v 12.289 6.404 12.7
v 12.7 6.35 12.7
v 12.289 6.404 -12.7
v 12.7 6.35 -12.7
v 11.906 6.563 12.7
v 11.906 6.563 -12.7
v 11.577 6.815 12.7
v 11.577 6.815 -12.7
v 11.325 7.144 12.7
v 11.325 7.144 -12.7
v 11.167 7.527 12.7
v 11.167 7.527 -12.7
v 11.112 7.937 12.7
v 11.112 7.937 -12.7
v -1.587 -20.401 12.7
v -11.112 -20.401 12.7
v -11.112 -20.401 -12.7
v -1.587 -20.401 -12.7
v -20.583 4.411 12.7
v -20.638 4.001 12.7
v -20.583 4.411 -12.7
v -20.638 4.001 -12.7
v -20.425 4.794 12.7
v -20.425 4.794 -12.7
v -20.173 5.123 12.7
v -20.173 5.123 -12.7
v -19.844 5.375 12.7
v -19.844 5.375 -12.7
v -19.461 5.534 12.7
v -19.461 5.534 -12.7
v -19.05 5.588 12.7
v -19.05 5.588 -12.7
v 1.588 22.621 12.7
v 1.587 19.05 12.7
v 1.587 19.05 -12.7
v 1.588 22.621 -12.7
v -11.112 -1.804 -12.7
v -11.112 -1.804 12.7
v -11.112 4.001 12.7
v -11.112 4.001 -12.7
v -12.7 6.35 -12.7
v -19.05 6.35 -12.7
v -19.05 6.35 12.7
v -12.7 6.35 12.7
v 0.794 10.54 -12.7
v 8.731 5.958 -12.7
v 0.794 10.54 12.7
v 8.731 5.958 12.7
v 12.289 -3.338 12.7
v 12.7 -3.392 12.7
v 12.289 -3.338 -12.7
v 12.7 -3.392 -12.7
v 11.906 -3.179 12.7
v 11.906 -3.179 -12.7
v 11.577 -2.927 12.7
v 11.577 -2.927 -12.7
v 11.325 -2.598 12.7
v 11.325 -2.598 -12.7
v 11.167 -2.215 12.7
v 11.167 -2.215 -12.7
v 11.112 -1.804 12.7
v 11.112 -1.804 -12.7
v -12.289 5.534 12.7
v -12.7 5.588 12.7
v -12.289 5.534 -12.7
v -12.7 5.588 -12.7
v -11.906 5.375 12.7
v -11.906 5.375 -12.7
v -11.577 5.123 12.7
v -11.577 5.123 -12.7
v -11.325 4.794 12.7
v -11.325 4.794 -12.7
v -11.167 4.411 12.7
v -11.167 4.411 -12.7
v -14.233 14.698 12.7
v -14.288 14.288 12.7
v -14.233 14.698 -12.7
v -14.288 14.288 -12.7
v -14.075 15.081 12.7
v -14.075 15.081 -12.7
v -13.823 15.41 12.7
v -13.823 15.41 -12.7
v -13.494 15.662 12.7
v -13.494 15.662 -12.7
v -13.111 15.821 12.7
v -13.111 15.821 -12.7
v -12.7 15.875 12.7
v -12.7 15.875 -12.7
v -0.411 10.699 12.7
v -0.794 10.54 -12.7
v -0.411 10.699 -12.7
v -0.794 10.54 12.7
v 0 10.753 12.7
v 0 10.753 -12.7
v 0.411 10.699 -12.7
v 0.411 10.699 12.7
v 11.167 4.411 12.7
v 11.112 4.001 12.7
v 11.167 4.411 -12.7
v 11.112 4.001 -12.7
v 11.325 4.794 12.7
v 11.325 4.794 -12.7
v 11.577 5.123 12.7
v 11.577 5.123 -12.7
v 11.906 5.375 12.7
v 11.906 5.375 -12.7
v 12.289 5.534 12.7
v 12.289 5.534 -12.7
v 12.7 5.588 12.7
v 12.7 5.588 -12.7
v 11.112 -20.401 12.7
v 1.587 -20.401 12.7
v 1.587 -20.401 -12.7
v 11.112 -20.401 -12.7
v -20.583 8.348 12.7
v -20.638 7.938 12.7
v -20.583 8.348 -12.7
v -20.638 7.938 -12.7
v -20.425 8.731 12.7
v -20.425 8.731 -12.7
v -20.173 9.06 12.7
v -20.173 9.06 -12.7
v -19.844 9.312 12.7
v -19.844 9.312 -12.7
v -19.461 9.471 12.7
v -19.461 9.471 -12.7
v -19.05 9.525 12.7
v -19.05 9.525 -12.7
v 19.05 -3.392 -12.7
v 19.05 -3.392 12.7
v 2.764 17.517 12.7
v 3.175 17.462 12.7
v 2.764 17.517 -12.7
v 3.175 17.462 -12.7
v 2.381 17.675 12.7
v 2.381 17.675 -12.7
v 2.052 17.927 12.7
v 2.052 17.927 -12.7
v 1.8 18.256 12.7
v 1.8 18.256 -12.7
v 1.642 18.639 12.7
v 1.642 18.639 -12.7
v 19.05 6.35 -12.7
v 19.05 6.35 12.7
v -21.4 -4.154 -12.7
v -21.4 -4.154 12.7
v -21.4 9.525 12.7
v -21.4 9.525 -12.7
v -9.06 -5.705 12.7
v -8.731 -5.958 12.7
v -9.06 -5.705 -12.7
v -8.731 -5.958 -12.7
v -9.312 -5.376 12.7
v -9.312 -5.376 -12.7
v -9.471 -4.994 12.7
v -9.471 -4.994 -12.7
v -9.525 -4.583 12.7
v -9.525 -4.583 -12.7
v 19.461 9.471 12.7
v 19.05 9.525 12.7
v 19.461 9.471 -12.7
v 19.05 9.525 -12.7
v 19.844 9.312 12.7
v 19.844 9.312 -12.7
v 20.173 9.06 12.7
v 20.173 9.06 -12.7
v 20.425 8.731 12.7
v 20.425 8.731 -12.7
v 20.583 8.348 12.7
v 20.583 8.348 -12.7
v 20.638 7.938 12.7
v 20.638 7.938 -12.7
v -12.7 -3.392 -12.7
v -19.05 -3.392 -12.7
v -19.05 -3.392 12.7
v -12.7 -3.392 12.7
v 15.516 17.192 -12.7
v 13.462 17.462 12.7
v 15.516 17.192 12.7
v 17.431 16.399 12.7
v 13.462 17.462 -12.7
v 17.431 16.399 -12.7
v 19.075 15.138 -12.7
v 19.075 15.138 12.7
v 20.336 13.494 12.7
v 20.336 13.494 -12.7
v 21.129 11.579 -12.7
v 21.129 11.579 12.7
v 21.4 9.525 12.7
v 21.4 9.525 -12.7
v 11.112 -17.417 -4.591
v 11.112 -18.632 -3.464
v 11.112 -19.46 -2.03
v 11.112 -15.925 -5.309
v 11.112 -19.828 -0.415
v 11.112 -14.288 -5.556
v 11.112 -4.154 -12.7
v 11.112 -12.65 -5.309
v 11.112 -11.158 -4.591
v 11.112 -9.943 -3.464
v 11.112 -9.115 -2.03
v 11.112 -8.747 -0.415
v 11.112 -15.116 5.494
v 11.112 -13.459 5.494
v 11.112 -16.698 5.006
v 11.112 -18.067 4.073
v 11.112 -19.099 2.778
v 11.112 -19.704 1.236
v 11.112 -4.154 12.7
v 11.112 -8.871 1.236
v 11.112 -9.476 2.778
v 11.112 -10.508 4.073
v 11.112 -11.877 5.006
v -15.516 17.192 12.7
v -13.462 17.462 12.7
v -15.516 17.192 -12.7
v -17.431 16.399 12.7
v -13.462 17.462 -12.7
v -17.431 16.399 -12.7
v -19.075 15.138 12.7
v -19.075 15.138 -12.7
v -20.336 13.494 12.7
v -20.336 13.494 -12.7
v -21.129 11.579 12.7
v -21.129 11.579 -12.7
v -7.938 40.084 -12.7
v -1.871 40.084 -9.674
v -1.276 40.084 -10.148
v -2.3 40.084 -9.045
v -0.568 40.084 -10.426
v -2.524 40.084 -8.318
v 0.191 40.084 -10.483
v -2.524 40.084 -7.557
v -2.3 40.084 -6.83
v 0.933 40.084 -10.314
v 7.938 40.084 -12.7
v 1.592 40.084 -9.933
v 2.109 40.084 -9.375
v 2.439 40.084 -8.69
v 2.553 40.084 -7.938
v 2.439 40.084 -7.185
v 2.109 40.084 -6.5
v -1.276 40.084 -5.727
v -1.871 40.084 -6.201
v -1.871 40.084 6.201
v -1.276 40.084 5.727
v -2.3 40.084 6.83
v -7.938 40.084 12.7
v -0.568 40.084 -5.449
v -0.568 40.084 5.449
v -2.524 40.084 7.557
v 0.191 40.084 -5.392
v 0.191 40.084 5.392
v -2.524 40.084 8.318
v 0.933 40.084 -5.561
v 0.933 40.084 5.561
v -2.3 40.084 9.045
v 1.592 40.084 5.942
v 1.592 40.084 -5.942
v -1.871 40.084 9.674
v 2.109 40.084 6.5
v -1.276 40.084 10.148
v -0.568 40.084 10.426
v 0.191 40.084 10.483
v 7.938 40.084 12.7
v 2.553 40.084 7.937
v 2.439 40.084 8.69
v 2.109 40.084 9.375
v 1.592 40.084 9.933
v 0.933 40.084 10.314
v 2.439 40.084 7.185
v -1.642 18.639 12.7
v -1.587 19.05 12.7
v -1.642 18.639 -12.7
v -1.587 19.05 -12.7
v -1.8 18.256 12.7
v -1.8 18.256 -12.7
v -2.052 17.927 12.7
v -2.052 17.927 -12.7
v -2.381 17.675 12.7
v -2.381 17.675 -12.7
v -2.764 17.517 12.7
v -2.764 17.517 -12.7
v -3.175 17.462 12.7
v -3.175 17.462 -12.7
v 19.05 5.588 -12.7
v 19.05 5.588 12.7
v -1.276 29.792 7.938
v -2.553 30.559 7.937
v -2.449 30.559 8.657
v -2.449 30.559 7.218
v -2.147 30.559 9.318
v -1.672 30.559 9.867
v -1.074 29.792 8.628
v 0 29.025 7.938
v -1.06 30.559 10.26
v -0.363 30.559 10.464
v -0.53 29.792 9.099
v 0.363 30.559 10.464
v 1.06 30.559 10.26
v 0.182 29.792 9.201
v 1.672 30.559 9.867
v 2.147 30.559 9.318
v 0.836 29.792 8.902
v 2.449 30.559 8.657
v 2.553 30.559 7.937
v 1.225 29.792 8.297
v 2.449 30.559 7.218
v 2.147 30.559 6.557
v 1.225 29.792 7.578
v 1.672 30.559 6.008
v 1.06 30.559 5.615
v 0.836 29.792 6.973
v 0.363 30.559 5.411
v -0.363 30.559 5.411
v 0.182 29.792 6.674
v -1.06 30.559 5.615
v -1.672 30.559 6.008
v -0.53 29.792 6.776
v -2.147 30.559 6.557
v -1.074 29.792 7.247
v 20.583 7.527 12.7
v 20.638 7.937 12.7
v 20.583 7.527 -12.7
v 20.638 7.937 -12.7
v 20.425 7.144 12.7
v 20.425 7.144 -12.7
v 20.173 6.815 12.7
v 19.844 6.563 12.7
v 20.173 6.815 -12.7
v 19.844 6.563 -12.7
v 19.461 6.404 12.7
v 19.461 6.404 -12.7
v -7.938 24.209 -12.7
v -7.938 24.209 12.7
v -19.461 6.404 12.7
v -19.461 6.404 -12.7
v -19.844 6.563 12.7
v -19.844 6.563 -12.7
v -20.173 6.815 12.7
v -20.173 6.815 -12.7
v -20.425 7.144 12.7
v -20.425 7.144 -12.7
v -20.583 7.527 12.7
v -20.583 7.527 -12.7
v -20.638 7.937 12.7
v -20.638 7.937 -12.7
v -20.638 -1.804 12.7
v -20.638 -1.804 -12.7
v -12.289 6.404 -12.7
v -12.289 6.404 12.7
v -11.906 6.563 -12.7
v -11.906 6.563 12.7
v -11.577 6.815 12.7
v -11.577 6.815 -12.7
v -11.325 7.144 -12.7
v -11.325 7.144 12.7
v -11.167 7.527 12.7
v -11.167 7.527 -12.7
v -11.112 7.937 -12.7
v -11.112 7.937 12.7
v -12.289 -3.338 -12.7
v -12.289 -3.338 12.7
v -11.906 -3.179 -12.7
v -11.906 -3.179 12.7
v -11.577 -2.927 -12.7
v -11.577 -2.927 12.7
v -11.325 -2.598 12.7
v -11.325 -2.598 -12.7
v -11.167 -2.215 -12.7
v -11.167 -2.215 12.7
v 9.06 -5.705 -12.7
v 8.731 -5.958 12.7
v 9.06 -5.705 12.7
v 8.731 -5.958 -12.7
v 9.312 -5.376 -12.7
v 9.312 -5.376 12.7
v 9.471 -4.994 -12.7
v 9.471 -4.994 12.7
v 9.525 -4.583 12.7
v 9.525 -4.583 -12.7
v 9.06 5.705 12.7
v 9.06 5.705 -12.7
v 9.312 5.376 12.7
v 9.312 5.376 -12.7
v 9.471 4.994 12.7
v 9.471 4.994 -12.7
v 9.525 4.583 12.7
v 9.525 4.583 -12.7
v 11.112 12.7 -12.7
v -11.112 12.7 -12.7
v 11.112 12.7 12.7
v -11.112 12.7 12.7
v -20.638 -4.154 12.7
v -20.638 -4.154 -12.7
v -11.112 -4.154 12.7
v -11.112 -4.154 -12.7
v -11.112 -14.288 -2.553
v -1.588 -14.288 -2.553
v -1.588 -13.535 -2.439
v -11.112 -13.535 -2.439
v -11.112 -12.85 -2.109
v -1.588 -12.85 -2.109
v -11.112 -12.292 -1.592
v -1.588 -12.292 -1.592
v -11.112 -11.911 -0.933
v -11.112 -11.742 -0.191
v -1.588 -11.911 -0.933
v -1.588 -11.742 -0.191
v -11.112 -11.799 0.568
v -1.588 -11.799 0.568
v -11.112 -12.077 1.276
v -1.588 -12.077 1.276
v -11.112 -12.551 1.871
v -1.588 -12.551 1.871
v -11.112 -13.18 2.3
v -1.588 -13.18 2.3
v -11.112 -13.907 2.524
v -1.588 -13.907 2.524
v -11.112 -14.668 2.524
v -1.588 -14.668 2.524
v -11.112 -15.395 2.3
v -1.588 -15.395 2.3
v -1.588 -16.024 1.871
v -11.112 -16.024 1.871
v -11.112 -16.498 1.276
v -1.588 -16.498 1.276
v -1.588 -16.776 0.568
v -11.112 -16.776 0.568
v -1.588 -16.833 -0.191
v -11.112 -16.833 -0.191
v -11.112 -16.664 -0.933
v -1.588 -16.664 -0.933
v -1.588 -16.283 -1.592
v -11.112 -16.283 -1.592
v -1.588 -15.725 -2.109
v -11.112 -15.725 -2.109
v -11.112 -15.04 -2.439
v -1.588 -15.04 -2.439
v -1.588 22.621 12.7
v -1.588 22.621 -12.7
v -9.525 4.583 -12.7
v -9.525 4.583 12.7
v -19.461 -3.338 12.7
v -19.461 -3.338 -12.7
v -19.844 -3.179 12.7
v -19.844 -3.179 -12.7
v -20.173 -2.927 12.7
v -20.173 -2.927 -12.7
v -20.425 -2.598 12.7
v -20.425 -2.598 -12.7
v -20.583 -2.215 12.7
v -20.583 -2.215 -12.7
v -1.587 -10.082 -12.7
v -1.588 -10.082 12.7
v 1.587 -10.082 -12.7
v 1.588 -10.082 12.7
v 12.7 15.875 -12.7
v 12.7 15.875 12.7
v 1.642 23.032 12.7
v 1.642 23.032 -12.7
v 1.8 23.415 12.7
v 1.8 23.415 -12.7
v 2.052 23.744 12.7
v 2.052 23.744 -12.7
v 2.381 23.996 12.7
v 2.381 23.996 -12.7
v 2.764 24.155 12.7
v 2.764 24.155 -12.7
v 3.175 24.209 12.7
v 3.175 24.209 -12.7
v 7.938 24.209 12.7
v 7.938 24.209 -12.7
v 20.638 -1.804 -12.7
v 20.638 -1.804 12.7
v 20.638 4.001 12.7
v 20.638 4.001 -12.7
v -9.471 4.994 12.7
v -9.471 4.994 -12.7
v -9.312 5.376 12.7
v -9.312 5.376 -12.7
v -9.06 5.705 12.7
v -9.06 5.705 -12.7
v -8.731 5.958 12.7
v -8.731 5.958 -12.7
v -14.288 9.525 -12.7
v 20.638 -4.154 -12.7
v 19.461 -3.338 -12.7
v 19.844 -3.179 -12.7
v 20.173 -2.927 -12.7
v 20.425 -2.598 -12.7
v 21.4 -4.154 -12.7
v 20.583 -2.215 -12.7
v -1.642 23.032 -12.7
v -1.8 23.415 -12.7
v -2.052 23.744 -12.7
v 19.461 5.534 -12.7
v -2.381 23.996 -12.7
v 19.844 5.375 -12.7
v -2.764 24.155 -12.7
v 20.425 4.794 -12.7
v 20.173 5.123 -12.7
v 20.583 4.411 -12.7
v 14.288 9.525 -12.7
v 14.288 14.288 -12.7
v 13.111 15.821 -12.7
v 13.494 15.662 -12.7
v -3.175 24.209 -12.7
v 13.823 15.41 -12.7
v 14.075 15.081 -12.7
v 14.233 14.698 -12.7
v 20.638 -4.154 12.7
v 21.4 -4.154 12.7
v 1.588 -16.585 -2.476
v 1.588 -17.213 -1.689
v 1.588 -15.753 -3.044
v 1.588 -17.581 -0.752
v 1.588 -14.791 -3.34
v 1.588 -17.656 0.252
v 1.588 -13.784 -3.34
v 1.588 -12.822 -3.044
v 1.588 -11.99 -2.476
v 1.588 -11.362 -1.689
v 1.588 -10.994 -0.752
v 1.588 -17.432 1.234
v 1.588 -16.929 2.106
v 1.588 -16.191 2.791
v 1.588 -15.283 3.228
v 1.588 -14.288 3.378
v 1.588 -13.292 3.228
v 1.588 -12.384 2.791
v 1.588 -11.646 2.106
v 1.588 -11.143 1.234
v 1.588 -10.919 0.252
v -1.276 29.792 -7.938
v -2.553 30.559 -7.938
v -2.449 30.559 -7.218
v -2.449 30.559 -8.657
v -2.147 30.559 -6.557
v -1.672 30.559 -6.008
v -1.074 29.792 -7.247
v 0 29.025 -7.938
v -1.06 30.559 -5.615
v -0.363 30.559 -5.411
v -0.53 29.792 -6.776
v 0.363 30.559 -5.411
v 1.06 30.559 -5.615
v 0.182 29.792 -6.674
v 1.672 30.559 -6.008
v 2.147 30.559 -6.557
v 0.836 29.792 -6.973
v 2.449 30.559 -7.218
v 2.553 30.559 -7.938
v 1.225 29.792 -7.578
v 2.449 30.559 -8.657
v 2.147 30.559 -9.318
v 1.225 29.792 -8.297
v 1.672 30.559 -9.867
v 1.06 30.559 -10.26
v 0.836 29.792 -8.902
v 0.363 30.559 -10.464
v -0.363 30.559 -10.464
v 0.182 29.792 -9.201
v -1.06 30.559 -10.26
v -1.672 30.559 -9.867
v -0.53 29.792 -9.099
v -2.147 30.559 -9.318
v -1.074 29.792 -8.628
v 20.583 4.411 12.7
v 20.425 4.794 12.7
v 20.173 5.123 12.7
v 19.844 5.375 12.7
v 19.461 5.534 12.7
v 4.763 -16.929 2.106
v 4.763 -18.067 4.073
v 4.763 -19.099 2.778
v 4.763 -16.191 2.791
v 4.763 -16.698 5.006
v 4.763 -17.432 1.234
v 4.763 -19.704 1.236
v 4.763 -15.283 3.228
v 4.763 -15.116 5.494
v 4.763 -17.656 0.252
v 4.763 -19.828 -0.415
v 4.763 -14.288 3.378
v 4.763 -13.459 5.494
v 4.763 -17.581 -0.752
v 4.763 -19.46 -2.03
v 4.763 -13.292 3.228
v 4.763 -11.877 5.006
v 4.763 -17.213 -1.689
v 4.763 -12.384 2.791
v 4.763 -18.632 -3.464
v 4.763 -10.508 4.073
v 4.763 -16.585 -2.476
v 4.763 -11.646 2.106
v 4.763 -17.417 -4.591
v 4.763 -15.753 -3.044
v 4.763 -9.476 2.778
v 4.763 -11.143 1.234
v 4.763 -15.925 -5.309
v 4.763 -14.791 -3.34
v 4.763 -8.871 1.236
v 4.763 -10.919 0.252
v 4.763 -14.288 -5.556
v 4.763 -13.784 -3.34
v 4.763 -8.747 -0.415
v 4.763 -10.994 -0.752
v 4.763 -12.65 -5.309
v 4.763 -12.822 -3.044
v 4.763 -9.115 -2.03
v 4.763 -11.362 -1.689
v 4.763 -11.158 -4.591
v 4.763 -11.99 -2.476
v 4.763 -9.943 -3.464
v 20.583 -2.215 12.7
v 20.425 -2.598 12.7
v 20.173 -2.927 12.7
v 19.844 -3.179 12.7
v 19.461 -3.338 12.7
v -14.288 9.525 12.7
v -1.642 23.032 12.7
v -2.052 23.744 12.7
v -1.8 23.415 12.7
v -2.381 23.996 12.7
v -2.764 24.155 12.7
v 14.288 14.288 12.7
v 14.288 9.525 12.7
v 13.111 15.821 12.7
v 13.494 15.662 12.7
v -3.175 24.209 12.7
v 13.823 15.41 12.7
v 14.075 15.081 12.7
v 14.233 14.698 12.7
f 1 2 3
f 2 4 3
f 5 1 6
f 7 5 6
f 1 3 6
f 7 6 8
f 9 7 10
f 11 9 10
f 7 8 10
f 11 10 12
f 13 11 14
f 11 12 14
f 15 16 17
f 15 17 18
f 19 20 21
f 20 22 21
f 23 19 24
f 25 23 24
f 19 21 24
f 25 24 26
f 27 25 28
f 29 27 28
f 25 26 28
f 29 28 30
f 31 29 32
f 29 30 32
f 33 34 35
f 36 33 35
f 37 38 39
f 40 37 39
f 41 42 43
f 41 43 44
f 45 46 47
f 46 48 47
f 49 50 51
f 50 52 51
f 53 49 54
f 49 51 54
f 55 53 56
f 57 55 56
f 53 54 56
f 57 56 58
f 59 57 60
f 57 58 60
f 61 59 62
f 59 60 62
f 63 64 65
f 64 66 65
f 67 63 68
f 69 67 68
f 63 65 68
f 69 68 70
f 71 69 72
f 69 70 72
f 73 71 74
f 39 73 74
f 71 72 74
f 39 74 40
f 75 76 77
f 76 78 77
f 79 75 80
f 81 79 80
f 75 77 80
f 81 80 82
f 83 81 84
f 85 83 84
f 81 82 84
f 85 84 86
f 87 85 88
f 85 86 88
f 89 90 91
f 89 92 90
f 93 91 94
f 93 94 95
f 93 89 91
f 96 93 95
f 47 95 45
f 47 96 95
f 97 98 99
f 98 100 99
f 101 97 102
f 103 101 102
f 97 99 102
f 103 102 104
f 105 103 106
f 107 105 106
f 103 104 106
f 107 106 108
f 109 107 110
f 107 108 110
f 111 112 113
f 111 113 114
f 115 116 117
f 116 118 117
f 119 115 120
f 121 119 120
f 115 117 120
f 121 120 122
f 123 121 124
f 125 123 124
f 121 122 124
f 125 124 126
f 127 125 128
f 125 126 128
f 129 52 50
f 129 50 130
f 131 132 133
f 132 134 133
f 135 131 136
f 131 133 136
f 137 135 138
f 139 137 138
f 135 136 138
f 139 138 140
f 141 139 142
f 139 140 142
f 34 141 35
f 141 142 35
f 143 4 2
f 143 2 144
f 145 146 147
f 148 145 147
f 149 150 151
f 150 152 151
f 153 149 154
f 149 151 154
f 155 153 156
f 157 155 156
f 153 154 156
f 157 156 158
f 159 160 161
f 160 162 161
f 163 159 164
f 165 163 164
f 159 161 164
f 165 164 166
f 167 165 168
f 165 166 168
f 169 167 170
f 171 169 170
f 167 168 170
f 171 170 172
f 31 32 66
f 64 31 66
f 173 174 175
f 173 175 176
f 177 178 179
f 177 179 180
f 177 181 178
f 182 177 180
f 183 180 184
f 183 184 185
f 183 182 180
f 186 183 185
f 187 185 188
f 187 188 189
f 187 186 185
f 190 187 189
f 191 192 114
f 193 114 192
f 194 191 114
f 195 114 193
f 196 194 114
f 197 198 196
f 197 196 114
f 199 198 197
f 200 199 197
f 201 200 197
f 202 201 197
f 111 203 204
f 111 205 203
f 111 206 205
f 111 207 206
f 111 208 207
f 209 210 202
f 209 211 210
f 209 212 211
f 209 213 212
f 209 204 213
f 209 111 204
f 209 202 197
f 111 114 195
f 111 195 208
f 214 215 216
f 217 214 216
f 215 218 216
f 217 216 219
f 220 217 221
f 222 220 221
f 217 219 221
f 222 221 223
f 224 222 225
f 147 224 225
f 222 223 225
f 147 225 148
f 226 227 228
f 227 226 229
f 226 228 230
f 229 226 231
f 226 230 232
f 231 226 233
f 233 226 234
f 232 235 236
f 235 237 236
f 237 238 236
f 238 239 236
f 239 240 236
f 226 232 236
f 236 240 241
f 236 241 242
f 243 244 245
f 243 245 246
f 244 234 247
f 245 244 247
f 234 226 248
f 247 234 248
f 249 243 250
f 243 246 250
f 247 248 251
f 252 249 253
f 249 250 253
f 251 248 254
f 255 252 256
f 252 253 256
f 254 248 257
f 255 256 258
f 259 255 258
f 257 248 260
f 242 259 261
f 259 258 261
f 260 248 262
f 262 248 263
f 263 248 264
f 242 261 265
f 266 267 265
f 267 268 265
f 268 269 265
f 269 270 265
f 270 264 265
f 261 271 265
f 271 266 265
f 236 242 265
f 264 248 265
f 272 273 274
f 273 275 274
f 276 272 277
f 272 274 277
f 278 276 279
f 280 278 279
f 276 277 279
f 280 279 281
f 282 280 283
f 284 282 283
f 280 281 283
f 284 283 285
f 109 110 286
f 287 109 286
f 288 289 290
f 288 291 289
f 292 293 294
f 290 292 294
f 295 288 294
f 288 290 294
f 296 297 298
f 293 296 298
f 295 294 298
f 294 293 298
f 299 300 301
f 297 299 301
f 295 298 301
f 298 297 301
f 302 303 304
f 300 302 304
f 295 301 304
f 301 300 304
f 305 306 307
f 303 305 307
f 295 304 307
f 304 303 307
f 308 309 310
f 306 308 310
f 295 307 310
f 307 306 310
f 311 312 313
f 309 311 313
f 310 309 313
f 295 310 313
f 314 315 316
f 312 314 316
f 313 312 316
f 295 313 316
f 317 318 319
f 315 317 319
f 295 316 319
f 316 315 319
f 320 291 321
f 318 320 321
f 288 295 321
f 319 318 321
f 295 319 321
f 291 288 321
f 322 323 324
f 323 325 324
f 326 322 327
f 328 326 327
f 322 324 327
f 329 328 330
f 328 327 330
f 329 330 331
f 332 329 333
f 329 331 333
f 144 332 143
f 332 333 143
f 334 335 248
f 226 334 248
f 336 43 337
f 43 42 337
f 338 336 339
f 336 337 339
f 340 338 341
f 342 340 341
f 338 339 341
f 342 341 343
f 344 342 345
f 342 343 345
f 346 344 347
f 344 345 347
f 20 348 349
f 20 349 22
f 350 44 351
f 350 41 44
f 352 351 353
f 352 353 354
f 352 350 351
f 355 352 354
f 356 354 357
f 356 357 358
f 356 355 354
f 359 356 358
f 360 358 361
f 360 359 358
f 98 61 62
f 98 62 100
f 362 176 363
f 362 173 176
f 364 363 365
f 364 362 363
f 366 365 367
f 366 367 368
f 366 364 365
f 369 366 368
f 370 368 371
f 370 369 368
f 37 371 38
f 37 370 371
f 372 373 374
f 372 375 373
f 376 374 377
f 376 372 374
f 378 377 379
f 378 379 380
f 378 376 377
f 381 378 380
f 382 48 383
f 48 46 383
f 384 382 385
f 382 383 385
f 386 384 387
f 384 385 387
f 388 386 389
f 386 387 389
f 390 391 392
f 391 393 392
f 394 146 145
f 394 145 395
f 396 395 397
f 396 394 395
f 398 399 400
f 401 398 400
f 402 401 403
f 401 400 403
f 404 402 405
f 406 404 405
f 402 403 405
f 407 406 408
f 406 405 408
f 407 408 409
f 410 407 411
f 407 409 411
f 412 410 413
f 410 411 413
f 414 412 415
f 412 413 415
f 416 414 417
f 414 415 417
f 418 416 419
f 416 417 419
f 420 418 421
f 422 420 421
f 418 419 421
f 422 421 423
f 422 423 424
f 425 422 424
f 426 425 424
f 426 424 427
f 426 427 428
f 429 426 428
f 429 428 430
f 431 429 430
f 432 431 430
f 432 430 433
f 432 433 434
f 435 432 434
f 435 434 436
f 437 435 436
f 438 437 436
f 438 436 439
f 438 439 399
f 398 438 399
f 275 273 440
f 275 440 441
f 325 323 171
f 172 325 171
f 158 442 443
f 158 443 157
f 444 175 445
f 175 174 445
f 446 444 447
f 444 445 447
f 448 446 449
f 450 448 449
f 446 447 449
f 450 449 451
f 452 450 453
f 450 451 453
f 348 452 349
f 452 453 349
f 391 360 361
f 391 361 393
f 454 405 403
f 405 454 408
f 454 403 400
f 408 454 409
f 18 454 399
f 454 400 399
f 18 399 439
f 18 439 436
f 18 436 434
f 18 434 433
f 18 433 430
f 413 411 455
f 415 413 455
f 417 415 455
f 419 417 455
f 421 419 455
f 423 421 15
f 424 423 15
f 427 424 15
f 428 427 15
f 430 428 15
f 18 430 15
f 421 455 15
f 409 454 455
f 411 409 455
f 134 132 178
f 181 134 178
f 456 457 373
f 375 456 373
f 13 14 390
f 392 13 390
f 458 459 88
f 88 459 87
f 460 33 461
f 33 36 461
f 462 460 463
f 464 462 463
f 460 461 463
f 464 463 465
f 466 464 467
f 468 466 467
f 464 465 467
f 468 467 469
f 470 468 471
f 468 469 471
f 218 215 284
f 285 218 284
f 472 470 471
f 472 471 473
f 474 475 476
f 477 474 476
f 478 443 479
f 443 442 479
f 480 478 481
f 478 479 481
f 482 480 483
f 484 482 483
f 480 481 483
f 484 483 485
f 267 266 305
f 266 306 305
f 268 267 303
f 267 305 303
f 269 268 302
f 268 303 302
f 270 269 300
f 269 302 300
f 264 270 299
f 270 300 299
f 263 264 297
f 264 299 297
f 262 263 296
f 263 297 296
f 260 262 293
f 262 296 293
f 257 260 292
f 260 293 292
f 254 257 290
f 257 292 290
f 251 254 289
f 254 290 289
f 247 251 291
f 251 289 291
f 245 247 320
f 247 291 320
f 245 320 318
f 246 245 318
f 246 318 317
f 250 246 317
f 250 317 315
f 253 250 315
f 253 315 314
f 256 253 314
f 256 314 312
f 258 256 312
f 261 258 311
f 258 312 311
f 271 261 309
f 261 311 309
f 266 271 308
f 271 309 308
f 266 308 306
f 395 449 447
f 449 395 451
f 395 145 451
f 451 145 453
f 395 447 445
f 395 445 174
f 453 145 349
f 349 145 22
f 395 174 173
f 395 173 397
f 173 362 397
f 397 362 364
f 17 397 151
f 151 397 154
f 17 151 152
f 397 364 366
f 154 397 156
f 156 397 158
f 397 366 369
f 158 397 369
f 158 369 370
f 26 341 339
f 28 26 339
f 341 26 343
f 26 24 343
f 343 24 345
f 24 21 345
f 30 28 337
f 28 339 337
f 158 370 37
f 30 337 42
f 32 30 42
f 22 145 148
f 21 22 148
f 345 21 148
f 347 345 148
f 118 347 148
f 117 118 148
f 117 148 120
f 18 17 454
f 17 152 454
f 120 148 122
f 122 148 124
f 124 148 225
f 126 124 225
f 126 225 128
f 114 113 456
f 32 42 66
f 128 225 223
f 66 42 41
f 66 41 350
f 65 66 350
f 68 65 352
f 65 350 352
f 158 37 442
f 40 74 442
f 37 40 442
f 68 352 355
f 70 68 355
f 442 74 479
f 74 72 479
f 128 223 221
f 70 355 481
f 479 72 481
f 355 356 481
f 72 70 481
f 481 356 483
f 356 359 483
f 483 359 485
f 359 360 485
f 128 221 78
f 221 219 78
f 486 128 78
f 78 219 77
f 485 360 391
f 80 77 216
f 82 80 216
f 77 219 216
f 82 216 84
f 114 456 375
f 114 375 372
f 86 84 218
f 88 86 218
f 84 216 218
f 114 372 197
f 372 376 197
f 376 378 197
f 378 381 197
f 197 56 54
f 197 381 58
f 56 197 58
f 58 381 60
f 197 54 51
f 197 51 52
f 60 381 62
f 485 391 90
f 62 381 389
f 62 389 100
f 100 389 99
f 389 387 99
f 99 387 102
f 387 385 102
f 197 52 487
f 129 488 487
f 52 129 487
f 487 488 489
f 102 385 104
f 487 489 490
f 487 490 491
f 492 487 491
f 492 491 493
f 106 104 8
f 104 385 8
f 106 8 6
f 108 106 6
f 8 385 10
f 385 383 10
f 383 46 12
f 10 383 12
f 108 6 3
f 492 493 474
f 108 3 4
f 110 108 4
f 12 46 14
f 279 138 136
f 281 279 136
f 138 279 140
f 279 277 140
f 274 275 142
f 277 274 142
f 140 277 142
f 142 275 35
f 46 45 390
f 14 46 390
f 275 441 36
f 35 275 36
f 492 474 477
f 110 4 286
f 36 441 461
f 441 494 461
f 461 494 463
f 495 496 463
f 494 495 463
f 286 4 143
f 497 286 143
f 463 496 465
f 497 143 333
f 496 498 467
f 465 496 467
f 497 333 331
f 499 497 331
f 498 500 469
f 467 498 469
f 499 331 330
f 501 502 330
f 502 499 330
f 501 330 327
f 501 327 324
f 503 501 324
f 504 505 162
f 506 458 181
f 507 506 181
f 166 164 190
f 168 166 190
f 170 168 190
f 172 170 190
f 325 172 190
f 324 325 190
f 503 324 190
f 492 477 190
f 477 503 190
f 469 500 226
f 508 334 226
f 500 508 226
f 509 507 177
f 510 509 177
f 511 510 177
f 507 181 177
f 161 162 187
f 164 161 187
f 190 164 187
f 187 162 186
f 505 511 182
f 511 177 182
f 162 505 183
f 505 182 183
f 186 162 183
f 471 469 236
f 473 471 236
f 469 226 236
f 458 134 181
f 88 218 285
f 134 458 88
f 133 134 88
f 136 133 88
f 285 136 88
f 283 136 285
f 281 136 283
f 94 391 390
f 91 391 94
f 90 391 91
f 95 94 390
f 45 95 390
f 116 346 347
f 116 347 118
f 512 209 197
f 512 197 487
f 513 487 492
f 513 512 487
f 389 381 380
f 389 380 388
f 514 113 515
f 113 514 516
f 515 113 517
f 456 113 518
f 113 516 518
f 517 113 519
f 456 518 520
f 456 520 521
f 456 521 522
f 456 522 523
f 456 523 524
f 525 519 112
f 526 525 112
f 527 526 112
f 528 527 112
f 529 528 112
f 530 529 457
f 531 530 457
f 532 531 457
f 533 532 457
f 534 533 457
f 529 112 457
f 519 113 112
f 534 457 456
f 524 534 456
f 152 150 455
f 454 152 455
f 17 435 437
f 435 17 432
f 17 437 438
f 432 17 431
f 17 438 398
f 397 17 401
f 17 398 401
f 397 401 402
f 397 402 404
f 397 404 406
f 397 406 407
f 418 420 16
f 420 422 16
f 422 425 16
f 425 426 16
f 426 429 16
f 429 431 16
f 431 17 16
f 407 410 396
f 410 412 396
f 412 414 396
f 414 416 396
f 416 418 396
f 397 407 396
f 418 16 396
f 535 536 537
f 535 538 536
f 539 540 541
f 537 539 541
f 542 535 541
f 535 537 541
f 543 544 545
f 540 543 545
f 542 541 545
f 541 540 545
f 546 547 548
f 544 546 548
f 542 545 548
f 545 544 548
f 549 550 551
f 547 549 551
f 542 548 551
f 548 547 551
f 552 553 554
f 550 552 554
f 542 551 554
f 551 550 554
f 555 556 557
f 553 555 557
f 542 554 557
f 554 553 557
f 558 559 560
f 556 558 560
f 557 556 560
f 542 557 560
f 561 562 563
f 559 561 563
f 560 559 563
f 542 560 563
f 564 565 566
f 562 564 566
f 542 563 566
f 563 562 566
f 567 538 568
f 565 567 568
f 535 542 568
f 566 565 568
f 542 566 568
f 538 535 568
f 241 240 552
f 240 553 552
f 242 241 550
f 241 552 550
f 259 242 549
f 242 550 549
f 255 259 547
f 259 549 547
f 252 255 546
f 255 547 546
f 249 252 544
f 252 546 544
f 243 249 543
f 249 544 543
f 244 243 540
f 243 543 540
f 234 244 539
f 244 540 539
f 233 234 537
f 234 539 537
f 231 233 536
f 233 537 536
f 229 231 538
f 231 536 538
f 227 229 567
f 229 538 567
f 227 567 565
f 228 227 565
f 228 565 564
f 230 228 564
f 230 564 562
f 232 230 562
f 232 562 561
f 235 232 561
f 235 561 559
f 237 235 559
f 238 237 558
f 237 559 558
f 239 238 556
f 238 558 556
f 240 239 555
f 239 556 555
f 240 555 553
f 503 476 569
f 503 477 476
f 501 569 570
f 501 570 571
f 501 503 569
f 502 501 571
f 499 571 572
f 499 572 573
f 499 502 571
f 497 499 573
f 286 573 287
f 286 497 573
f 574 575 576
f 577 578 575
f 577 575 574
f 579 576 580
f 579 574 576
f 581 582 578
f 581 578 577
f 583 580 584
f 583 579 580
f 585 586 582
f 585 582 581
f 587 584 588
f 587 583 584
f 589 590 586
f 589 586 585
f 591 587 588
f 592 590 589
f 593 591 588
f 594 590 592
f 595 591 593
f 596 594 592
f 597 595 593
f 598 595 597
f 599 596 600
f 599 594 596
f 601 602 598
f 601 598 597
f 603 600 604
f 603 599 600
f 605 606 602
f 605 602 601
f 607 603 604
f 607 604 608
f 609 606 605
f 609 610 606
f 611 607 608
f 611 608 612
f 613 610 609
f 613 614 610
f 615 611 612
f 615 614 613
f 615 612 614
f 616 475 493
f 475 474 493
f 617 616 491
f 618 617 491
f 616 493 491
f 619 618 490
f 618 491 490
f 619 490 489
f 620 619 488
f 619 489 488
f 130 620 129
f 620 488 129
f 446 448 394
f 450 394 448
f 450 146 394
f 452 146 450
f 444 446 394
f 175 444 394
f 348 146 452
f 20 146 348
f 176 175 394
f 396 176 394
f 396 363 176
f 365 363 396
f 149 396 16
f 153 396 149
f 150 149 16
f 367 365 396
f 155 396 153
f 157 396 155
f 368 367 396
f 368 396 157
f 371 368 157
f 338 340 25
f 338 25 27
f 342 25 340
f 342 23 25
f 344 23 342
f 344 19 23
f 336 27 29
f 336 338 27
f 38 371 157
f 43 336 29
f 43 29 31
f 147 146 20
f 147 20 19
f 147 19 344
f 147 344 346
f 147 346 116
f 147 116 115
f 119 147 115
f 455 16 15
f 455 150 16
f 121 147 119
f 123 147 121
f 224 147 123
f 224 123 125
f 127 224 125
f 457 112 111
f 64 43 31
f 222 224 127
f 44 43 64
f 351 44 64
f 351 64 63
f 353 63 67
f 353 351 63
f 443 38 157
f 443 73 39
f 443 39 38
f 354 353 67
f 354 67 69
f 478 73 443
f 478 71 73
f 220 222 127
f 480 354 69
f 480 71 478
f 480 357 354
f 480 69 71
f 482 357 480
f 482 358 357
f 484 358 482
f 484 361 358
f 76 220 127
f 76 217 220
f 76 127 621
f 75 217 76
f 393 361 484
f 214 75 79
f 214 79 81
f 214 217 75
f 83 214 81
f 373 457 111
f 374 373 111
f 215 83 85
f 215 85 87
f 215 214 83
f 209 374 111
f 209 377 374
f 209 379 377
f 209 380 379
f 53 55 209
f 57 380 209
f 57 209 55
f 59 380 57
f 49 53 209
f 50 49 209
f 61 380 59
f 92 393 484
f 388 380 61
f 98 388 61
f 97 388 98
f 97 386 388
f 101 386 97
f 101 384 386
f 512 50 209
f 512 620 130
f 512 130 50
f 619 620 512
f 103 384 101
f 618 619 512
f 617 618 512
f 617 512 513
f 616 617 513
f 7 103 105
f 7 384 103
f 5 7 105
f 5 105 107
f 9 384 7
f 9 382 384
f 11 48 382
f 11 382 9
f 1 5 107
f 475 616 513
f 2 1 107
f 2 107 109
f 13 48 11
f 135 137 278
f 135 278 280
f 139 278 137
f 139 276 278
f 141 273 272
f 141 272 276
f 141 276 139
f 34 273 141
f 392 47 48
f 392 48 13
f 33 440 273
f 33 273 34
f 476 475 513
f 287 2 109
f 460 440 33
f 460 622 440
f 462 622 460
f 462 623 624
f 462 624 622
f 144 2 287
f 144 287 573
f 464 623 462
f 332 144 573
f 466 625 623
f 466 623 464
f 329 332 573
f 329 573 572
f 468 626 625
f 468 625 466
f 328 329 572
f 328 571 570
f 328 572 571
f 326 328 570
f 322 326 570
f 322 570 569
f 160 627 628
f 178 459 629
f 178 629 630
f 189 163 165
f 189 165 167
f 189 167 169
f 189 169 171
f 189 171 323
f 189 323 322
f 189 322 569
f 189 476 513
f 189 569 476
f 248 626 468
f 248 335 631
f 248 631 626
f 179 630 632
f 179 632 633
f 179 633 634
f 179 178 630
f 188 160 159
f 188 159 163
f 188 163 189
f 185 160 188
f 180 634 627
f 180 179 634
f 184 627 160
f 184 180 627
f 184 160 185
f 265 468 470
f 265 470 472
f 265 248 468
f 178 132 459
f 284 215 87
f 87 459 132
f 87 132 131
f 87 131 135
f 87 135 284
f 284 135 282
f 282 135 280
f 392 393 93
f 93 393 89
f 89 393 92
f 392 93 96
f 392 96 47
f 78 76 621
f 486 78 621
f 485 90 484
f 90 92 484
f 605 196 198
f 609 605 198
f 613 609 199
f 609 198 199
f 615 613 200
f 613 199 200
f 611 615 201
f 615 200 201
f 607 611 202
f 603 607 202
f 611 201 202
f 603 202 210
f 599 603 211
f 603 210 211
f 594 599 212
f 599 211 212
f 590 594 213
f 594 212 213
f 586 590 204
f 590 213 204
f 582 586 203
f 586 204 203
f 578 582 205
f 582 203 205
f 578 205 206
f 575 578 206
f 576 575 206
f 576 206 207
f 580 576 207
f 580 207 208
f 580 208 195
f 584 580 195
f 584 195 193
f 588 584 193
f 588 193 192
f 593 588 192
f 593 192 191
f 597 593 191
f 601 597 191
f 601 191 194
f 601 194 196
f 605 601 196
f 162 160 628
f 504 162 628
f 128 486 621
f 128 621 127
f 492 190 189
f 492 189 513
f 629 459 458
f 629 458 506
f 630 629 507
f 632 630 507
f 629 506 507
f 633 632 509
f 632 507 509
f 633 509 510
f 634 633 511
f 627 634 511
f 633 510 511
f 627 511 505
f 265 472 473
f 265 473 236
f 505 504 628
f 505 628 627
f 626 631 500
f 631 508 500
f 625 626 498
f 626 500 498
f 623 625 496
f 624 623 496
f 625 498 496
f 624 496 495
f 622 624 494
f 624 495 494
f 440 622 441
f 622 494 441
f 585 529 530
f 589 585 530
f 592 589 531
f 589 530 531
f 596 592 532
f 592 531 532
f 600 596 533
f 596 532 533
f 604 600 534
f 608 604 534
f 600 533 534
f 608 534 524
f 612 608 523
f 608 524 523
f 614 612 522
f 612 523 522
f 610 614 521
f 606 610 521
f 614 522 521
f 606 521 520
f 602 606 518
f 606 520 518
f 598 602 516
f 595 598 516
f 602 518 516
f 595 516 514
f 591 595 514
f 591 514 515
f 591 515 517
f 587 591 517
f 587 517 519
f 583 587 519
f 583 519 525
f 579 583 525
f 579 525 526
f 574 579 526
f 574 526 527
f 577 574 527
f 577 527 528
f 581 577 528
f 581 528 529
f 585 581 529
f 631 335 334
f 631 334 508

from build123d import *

# Parameters (mm, degrees)
SKETCH1_W                                        = 22.225
SKETCH1_H                                        = 25.4
EXTRUDE1_DEPTH                                   = 12.7
SKETCH2_W                                        = 9.525
SKETCH2_H                                        = 0.762
EXTRUDE2_DEPTH                                   = 25.4
SKETCH3_W                                        = 0.762
SKETCH3_H                                        = 13.678822609
EXTRUDE3_DEPTH                                   = 25.4
EXTRUDE4_DEPTH                                   = 25.4
SKETCH7_W                                        = 3.175
SKETCH7_H                                        = 25.4
EXTRUDE5_DEPTH                                   = 6.74624
SKETCH8_W                                        = 15.875
SKETCH8_H                                        = 15.875
EXTRUDE6_DEPTH                                   = 25.4
F_1_4_20_TAPPED_HOLE1_D                          = 5.1054
F_1_4_20_TAPPED_HOLE1_DEPTH                      = 9.525
F_1_4_20_TAPPED_HOLE1_TIP                        = 1.533816902
EXTRUDE7_DEPTH                                   = 53.055785583
SKETCH10_W                                       = 9.525
SKETCH10_H                                       = 7.700729076
EXTRUDE8_DEPTH                                   = 25.4
CBORE_FOR_1_4_SOCKET_HEAD_CAP_SCREW1_D           = 6.7564
CBORE_FOR_1_4_SOCKET_HEAD_CAP_SCREW1_DEPTH       = 9.525
CBORE_FOR_1_4_SOCKET_HEAD_CAP_SCREW1_CBORE_D     = 11.1125
CBORE_FOR_1_4_SOCKET_HEAD_CAP_SCREW1_CBORE_DEPTH = 6.35
F_1_4_20_TAPPED_HOLE2_D                          = 5.1054
FILLET1_R                                        = 1.5875
FILLET2_R                                        = 7.9375


with BuildPart() as part:
    # Sketch1 → Extrude1 (new, symmetric)
    with BuildSketch(Plane.XY):
        Rectangle(SKETCH1_W, SKETCH1_H)
        Polygon((0, 10.998522628), (-9.525, 5.499261314), (-9.525, -5.499261314), (0, -10.998522628), (9.525, -5.499261314), (9.525, 5.499261314), align=None, mode=Mode.SUBTRACT)
    extrude(amount=EXTRUDE1_DEPTH, both=True)

    # Sketch2 → Extrude2 (add)
    with BuildSketch(Plane.XY.offset(12.7)):
        with Locations((15.875, 5.969)):
            Rectangle(SKETCH2_W, SKETCH2_H)
        with Locations((15.875, -3.772822609)):
            Rectangle(SKETCH2_W, SKETCH2_H)
        with Locations((-15.875, -3.772822609)):
            Rectangle(SKETCH2_W, SKETCH2_H)
        with Locations((-15.875, 5.969)):
            Rectangle(SKETCH2_W, SKETCH2_H)
    extrude(amount=-EXTRUDE2_DEPTH)

    # Sketch3 → Extrude3 (add)
    with BuildSketch(Plane.XY.offset(12.7)):
        with Locations((21.0185, 2.685588695)):
            Rectangle(SKETCH3_W, SKETCH3_H)
        with Locations((-21.0185, 2.685588695)):
            Rectangle(SKETCH3_W, SKETCH3_H)
    extrude(amount=-EXTRUDE3_DEPTH)

    # Sketch4 → Extrude4 (add)
    with BuildSketch(Plane.XY.offset(12.7)):
        Polygon((-21.3995, 17.4625), (21.3995, 17.4625), (21.3995, 9.525), (14.2875, 9.525), (14.2875, 15.875), (-14.2875, 15.875), (-14.2875, 9.525), (-21.3995, 9.525), align=None)
    extrude(amount=-EXTRUDE4_DEPTH)

    # Sketch7 → Extrude5 (add)
    with BuildSketch(Plane(origin=(0, 17.4625, 0), x_dir=(1, 0, 0), z_dir=(0, 1, 0))):
        Rectangle(SKETCH7_W, SKETCH7_H)
    extrude(amount=EXTRUDE5_DEPTH)

    # Sketch8 → Extrude6 (add)
    with BuildSketch(Plane.XY.offset(12.7)):
        with Locations((0, 32.14624)):
            Rectangle(SKETCH8_W, SKETCH8_H)
    extrude(amount=-EXTRUDE6_DEPTH)

    # 1/4-20 Tapped Hole1
    with Locations(Plane(origin=(-10.978640872, 40.08374, -1.669383244), x_dir=(-1, 0, 0), z_dir=(0, 1, 0))):
        with Locations((-10.978640872, -6.268116756), (-10.978640872, 9.606883244)):
            Hole(F_1_4_20_TAPPED_HOLE1_D / 2, depth=F_1_4_20_TAPPED_HOLE1_DEPTH)
            with Locations((0, 0, -(F_1_4_20_TAPPED_HOLE1_DEPTH + F_1_4_20_TAPPED_HOLE1_TIP / 2))):  # 118° drill point
                Cone(0, F_1_4_20_TAPPED_HOLE1_D / 2, F_1_4_20_TAPPED_HOLE1_TIP, mode=Mode.SUBTRACT)

    # Sketch9 → Extrude7 (cut, through all)
    with BuildSketch(Plane.XY.offset(12.7)):
        Polygon((-1.5875, -10.081979076), (-1.5875, -12.7), (1.5875, -12.7), (1.5875, -10.081979076), (0, -10.998522628), align=None)
    extrude(amount=-EXTRUDE7_DEPTH, mode=Mode.SUBTRACT)

    # Sketch10 → Extrude8 (add)
    with BuildSketch(Plane.XY.offset(12.7)):
        with Locations((6.35, -16.550364538)):
            Rectangle(SKETCH10_W, SKETCH10_H)
        with Locations((-6.35, -16.550364538)):
            Rectangle(SKETCH10_W, SKETCH10_H)
    extrude(amount=-EXTRUDE8_DEPTH)

    # CBORE for 1/4 Socket Head Cap Screw1
    with Locations(Plane(origin=(11.1125, 0, 0), x_dir=(0, 0, -1), z_dir=(1, 0, 0))):
        with Locations((0, -14.2875)):
            CounterBoreHole(CBORE_FOR_1_4_SOCKET_HEAD_CAP_SCREW1_D / 2, CBORE_FOR_1_4_SOCKET_HEAD_CAP_SCREW1_CBORE_D / 2, CBORE_FOR_1_4_SOCKET_HEAD_CAP_SCREW1_CBORE_DEPTH, depth=CBORE_FOR_1_4_SOCKET_HEAD_CAP_SCREW1_DEPTH)

    # 1/4-20 Tapped Hole2 (through all)
    with Locations(Plane.ZY.offset(11.1125)):
        with Locations((0, -14.2875)):
            Hole(F_1_4_20_TAPPED_HOLE2_D / 2)

    # Fillet1
    fillet1_edges = [part.edges().sort_by_distance(p)[0] for p in [
        (-1.5875, 17.4625, 0),
        (1.5875, 17.4625, 0),
        (1.5875, 24.20874, 0),
        (-1.5875, 24.20874, 0),
        (11.1125, 5.588, 0),
        (20.6375, -3.391822609, 0),
        (-11.1125, -3.391822609, 0),
        (-11.1125, 5.588, 0),
        (20.6375, 5.588, 0),
        (11.1125, -3.391822609, 0),
        (-20.6375, -3.391822609, 0),
        (-20.6375, 6.35, 0),
        (-20.6375, 9.525, 0),
        (-20.6375, 5.588, 0),
        (9.525, -5.499261314, 0),
        (9.525, 5.499261314, 0),
        (0, 10.998522628, 0),
        (-9.525, 5.499261314, 0),
        (-9.525, -5.499261314, 0),
        (-11.1125, 6.35, 0),
        (-14.2875, 15.875, 0),
        (14.2875, 15.875, 0),
        (20.6375, 6.35, 0),
        (20.6375, 9.525, 0),
        (11.1125, 6.35, 0),
    ]]
    fillet(fillet1_edges, radius=FILLET1_R - 0.0001)  # a hair under: the kernel refuses the full size

    # Fillet2
    fillet2_edges = [part.edges().sort_by_distance(p)[0] for p in [
        (21.3995, 17.4625, 0),
        (-21.3995, 17.4625, 0),
    ]]
    fillet(fillet2_edges, radius=FILLET2_R)


solid = part.part
